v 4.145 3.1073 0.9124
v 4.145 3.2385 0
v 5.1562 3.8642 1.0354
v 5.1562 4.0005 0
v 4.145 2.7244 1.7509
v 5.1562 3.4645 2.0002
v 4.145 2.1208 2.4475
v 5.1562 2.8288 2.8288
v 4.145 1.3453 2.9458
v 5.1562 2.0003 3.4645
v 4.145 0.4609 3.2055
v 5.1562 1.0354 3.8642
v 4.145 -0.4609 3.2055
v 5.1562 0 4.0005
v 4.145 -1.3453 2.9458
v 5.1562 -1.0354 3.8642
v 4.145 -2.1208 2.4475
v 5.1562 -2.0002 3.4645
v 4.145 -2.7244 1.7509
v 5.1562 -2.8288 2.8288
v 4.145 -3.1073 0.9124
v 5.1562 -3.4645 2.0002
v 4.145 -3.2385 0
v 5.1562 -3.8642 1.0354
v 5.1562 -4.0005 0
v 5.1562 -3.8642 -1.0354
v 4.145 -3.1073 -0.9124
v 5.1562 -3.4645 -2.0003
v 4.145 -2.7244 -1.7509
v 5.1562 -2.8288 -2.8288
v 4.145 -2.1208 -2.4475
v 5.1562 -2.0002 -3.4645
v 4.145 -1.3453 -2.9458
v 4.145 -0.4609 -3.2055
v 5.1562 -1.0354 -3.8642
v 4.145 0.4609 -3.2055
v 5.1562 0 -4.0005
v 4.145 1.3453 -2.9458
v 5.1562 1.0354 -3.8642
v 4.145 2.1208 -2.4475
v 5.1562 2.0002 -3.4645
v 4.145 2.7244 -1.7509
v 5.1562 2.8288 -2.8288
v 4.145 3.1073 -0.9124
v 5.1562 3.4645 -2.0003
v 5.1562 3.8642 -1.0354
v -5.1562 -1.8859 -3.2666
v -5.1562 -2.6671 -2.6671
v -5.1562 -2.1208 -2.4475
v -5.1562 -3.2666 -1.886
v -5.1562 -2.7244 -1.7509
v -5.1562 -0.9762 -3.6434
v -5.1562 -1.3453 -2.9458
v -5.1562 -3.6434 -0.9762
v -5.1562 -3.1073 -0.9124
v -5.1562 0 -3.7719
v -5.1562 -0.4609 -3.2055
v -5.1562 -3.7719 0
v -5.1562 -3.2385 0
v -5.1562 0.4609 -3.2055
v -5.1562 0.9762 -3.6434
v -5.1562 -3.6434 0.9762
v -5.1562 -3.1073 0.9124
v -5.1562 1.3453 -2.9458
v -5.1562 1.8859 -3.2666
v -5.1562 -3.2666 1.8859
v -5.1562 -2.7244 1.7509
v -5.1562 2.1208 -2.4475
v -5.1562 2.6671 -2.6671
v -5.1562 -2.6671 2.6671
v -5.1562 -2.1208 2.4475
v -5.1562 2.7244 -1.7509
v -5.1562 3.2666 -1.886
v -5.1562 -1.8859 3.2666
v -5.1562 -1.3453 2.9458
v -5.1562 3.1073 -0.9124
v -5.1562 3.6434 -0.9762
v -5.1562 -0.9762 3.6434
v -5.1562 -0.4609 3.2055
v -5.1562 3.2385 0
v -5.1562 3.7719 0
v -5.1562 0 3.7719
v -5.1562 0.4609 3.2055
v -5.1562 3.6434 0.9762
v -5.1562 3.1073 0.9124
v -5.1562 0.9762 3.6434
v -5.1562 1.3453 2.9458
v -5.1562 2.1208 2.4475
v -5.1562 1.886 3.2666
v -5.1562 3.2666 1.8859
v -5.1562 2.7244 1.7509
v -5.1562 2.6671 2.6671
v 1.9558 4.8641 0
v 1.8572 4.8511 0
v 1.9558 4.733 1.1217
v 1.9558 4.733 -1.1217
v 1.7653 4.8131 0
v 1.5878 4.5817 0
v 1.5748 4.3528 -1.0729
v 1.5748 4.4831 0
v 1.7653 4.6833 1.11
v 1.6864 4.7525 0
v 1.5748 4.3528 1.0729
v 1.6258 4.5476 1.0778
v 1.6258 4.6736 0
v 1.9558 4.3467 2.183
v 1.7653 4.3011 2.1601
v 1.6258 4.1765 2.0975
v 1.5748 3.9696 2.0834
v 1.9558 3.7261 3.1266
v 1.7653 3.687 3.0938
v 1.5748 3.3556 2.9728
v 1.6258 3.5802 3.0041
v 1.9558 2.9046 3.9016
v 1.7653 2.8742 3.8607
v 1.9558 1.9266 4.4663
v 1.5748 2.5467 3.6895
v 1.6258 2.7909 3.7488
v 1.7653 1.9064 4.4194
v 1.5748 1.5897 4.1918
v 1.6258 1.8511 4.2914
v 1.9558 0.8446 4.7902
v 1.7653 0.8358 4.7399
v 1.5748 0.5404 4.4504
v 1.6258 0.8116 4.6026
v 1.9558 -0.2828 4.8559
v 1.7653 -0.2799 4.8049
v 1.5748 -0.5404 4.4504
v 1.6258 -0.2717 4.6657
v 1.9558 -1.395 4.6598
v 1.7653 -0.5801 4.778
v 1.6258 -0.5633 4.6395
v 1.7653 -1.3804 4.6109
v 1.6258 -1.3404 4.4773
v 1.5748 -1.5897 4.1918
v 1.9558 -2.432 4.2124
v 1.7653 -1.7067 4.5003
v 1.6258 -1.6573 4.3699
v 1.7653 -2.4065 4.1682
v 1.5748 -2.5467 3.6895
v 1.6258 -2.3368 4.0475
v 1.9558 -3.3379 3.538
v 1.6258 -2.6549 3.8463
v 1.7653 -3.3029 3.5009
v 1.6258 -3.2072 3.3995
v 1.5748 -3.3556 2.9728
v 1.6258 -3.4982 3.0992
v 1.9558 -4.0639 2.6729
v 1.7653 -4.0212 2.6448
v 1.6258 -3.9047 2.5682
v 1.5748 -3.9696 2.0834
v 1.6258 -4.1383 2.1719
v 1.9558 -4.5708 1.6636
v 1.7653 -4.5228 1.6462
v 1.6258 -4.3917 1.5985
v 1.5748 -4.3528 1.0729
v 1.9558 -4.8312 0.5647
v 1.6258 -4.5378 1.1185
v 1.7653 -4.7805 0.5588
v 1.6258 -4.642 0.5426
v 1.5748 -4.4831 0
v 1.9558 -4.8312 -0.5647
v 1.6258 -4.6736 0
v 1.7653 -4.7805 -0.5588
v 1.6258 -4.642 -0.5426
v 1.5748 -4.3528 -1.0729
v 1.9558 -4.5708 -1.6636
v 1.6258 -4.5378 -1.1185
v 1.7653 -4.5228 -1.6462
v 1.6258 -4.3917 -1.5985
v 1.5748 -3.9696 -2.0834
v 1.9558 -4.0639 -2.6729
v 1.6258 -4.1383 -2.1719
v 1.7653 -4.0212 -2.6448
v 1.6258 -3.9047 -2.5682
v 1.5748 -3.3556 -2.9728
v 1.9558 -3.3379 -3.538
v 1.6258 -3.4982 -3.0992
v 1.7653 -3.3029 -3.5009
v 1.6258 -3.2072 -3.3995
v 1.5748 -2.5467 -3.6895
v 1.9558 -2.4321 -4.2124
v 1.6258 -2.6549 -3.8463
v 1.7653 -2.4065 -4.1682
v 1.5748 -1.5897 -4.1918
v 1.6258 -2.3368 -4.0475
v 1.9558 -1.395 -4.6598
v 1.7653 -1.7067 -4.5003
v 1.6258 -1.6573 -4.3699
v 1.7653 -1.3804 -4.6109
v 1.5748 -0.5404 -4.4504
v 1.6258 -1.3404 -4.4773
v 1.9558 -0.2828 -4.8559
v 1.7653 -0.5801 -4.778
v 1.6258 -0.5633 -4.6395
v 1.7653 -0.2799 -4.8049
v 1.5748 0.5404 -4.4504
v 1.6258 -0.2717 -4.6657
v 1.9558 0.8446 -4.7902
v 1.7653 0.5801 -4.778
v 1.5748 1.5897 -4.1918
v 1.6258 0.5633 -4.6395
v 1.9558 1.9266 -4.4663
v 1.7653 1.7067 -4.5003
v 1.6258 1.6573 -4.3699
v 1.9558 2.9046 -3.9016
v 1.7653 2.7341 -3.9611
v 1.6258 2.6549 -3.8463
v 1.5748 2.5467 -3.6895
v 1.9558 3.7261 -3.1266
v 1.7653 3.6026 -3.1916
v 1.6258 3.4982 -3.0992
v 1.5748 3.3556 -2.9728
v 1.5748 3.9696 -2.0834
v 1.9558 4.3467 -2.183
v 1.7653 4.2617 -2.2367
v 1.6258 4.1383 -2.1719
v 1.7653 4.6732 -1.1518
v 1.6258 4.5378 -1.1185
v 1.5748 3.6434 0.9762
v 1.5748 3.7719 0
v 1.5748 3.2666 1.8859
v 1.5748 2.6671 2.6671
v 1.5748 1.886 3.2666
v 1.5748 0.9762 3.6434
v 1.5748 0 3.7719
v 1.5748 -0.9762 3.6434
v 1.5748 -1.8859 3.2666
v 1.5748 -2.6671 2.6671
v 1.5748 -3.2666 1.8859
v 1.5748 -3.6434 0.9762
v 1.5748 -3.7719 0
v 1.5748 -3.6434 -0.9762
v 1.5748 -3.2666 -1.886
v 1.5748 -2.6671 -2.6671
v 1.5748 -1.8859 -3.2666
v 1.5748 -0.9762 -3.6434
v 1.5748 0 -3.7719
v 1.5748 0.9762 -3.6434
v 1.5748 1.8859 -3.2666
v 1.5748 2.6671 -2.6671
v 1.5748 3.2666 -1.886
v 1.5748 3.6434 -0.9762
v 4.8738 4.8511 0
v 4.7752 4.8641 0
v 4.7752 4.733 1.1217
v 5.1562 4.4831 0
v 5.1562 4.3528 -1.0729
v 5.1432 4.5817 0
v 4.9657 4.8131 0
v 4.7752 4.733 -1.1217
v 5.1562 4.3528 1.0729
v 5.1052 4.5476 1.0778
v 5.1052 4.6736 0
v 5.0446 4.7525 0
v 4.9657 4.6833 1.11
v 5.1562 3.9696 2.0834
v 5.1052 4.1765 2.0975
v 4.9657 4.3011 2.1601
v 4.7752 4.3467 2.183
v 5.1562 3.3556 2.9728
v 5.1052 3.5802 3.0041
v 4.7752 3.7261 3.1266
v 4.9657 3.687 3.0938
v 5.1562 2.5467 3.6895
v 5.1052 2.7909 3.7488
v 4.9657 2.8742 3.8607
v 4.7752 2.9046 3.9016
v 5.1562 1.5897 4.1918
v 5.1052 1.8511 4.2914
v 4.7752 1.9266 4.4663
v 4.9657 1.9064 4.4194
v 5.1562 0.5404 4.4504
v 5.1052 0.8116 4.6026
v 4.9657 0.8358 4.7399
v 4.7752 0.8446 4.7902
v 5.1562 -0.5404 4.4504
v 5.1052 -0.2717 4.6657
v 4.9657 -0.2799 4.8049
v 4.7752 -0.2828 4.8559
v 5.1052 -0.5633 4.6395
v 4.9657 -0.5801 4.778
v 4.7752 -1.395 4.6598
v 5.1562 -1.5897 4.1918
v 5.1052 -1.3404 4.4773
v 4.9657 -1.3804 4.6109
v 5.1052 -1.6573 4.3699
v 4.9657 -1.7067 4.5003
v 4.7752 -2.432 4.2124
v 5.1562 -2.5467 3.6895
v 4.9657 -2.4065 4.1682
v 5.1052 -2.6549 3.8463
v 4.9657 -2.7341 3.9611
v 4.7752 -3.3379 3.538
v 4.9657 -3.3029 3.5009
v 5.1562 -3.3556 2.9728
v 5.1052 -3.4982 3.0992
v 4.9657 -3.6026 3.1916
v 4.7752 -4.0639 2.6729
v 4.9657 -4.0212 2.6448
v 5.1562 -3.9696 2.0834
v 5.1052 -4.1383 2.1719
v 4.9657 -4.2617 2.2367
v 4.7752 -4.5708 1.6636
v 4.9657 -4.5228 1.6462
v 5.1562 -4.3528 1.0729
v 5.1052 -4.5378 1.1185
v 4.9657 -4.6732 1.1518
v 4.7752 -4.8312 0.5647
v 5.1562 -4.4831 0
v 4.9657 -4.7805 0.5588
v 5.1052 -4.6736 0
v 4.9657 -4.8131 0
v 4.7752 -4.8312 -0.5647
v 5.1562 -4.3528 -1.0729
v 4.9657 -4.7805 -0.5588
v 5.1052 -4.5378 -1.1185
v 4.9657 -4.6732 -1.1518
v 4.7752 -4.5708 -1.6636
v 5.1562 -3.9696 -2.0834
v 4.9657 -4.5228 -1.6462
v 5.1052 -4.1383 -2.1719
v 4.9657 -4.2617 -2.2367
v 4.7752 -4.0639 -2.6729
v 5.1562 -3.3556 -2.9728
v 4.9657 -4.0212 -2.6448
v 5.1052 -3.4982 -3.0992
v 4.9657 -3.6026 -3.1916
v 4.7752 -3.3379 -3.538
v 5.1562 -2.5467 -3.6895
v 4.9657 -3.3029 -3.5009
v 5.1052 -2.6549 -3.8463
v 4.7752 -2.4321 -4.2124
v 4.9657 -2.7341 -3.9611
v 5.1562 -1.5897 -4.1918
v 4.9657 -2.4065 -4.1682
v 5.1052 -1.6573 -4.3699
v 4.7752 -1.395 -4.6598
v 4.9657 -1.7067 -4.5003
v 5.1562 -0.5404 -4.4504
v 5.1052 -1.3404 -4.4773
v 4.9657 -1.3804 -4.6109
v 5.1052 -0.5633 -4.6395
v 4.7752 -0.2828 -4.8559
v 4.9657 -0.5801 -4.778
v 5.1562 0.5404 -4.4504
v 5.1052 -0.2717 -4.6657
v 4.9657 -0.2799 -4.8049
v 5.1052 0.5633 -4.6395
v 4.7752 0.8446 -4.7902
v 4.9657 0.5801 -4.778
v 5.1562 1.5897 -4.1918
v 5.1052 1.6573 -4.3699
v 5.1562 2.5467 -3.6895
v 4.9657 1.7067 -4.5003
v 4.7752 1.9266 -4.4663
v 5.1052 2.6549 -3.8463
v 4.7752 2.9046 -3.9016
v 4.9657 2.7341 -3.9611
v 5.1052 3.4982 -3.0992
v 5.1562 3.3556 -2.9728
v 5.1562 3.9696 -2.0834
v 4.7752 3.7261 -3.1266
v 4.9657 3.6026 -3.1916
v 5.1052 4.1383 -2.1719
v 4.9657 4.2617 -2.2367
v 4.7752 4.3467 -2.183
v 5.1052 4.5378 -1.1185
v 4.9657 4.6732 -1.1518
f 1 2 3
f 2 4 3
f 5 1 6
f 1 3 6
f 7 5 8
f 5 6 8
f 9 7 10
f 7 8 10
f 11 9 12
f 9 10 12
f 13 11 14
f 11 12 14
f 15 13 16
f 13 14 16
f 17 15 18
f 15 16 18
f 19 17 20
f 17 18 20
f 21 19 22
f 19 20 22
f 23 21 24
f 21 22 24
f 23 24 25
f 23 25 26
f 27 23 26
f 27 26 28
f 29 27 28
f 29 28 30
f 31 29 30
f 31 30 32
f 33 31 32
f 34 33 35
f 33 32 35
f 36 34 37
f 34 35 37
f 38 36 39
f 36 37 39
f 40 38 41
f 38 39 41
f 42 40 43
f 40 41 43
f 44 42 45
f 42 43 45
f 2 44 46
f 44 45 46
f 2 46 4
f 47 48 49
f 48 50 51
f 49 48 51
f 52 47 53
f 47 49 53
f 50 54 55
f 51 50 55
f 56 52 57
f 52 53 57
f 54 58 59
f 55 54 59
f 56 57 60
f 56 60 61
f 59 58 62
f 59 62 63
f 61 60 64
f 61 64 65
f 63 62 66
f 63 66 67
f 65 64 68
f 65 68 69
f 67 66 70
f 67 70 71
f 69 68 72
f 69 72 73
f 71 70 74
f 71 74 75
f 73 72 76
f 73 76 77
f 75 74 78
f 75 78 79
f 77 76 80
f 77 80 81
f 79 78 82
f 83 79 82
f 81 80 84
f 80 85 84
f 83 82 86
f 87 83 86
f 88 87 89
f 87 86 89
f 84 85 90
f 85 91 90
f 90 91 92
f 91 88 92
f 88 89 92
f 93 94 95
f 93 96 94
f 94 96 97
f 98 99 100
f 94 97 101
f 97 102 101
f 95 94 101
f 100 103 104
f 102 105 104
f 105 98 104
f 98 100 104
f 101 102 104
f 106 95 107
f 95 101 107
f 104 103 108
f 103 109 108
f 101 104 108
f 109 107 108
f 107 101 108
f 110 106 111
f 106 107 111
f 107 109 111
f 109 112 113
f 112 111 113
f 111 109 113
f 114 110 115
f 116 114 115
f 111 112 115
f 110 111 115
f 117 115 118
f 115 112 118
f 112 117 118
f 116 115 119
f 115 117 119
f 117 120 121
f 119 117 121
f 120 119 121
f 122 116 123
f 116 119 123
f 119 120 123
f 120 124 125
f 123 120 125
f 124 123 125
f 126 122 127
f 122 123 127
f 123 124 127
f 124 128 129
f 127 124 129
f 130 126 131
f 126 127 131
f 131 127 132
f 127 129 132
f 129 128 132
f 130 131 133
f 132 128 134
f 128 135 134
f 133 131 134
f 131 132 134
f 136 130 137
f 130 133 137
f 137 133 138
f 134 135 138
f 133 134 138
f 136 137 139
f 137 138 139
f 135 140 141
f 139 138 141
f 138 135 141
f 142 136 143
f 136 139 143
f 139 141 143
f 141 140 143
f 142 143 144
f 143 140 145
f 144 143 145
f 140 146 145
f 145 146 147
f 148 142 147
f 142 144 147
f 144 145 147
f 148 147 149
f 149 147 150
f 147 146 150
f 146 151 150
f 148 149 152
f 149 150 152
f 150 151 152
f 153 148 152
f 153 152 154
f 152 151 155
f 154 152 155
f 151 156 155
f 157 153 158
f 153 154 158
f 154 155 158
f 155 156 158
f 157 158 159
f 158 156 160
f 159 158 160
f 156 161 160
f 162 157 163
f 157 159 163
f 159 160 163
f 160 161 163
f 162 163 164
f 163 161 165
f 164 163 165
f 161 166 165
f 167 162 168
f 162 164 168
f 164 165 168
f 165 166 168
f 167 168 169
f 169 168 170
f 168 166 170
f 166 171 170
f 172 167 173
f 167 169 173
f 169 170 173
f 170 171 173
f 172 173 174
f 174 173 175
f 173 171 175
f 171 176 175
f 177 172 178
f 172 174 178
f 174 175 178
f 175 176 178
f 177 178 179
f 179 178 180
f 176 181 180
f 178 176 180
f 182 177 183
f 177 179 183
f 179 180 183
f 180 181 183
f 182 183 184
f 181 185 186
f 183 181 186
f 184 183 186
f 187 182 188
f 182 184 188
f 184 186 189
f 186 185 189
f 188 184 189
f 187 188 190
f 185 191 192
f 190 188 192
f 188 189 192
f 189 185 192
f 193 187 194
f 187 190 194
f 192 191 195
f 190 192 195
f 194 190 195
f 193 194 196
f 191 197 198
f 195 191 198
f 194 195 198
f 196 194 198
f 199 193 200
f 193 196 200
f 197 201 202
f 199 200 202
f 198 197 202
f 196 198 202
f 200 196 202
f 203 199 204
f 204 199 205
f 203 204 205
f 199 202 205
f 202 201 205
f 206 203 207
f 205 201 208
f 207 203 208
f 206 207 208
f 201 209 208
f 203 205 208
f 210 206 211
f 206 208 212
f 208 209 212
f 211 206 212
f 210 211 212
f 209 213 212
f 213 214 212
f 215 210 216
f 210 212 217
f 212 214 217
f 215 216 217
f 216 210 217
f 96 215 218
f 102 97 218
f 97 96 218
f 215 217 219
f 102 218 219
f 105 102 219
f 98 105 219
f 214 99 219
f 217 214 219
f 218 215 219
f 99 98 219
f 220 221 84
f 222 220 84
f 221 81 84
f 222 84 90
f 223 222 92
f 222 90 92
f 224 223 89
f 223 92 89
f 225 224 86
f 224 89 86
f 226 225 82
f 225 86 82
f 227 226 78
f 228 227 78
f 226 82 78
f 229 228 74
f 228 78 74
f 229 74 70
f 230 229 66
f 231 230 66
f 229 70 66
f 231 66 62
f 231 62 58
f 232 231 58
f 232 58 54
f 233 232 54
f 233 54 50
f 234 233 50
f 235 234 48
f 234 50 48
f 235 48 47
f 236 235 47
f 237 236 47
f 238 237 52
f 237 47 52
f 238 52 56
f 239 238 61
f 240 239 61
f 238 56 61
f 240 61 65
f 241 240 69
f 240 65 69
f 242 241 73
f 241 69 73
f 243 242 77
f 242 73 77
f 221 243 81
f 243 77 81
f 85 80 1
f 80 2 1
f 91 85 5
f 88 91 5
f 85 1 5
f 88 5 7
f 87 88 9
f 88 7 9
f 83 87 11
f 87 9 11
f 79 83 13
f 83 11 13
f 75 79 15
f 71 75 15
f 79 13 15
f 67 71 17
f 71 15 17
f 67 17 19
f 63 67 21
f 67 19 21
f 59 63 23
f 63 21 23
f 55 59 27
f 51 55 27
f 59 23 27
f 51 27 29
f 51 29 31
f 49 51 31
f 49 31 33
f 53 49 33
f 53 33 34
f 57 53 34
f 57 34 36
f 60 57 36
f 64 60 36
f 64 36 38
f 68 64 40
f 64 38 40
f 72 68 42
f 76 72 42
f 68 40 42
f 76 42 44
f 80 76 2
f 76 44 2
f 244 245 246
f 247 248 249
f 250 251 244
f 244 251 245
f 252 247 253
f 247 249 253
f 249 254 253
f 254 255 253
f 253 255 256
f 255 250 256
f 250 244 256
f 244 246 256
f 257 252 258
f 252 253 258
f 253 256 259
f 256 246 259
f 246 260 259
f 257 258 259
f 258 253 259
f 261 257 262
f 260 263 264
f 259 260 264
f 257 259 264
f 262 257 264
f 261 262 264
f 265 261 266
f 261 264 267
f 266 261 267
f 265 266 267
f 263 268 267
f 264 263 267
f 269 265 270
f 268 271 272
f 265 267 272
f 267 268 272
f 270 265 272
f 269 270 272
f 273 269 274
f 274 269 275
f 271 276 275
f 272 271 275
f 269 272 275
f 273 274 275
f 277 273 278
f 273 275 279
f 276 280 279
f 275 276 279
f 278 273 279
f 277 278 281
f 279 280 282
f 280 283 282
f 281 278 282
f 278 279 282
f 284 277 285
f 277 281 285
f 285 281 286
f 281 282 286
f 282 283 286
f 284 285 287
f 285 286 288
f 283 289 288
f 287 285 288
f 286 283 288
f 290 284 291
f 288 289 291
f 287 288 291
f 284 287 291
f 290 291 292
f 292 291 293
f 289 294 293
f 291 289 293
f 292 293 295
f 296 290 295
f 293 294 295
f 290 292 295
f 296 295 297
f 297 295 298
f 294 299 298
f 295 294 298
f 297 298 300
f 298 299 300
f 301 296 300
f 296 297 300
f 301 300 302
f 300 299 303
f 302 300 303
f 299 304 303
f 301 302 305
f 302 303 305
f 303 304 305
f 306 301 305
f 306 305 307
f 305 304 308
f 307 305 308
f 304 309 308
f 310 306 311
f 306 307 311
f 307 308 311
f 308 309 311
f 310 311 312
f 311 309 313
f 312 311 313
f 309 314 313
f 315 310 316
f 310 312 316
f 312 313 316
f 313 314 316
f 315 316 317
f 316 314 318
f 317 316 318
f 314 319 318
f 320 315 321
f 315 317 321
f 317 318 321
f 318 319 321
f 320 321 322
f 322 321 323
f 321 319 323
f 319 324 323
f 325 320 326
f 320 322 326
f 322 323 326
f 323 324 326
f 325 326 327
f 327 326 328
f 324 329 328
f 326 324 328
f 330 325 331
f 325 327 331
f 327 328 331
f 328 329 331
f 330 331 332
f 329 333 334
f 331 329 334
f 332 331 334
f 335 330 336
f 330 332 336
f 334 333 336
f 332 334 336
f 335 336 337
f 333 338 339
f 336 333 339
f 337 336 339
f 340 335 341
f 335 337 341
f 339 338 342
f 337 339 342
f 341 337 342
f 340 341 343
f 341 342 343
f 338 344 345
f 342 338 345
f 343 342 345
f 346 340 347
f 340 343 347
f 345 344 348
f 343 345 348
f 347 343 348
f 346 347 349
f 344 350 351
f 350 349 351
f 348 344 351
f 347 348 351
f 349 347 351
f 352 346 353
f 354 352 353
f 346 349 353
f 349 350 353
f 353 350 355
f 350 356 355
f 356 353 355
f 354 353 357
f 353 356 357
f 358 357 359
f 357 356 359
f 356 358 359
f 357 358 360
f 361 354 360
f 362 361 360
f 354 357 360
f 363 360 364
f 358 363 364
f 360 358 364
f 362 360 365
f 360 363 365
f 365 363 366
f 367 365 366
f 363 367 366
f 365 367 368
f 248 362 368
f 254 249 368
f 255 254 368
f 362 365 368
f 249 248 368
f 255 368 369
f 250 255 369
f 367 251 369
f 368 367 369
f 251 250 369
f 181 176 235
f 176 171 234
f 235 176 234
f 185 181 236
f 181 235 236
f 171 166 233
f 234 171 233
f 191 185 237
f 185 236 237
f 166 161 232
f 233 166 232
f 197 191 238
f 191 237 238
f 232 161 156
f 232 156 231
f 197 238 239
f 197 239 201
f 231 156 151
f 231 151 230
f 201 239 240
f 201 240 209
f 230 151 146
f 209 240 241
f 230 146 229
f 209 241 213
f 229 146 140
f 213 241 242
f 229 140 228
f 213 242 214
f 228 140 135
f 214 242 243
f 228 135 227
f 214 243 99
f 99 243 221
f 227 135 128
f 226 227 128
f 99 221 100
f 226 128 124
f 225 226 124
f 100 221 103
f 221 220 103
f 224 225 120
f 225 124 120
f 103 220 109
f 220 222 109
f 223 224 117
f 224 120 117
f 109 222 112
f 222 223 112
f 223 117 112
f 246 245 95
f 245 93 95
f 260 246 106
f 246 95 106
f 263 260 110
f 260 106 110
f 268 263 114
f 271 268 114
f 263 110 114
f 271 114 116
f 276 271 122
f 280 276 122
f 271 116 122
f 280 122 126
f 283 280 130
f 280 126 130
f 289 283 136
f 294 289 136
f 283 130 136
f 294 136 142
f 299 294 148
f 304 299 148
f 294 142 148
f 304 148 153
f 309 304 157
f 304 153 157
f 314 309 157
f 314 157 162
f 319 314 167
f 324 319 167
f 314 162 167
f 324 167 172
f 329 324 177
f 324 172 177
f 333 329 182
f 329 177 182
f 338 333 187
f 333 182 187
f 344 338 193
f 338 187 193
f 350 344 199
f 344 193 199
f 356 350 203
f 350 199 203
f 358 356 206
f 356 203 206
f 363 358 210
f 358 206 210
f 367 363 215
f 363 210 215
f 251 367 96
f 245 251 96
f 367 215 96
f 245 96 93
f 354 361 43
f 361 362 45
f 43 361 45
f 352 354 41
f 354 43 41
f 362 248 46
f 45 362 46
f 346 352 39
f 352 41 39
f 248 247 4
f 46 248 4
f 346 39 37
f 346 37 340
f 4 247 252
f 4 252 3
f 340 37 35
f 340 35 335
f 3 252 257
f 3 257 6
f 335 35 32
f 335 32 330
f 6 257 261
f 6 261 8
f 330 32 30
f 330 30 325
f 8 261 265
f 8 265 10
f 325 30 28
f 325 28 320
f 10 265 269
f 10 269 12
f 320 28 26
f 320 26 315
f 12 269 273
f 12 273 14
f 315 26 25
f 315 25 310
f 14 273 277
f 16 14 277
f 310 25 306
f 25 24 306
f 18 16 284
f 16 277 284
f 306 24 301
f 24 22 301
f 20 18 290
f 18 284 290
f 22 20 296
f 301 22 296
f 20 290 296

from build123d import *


with BuildPart() as part:
    # Sketch1 → Revolve1 (revolve)
    with BuildSketch(Plane.XY):
        with BuildLine():
            Line((-5.1562, 3.2385), (4.144991846, 3.2385))
            Line((4.144991846, 3.2385), (5.1562, 4.0005))
            Line((5.1562, 4.0005), (5.1562, 4.4831))
            ThreePointArc((5.1562, 4.4831), (5.044607684, 4.752507684), (4.7752, 4.8641))
            Line((4.7752, 4.8641), (1.9558, 4.8641))
            ThreePointArc((1.9558, 4.8641), (1.686392316, 4.752507684), (1.5748, 4.4831))
            Line((1.5748, 4.4831), (1.5748, 3.7719))
            Line((1.5748, 3.7719), (-5.1562, 3.7719))
            Line((-5.1562, 3.7719), (-5.1562, 3.2385))
        make_face()
    revolve(axis=Axis((-5.1562, 0, 0), (1, 0, 0)))


solid = part.part
